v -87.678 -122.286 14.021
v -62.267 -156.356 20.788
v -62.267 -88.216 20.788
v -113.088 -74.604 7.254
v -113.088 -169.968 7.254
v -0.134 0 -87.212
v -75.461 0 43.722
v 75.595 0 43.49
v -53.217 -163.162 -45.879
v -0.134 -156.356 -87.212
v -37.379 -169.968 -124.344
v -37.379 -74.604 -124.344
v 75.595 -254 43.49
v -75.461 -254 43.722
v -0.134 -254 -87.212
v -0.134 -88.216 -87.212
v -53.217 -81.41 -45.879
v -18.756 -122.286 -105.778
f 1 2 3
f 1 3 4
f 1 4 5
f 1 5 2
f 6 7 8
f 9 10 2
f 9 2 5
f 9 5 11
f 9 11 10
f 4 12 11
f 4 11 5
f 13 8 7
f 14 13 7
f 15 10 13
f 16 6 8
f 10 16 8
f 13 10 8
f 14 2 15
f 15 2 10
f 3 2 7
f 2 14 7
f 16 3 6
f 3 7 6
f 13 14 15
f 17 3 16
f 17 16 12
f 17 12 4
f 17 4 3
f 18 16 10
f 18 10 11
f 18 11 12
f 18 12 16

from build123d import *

# Parameters (mm, degrees)
F1_DEPTH = 254
F2_W     = 68.1403651834
F2_H     = 124.5979337706
F3_DEPTH = 50.8
F3_TAPER = -15


with BuildPart() as f1:
    # F0 (on Front) → F1 (new body)
    with BuildSketch(Plane.XZ):
        Polygon((-0.1336607501, -87.2124684732), (75.5950435996, 43.4904806316), (-75.4613828496, 43.7219878417), align=None)
    extrude(amount=F1_DEPTH)

    # F2 (on face) → F3 (join)
    with BuildSketch(Plane(origin=(-37.7975217998, 0, -21.7452403158), x_dir=(0, -1, 0), z_dir=(-0.8667906796, 0, -0.4986721545))):
        with Locations((122.2858987749, -13.2293350405)):
            Rectangle(F2_W, F2_H)
    extrude(amount=F3_DEPTH, taper=F3_TAPER)


solid = f1.part
